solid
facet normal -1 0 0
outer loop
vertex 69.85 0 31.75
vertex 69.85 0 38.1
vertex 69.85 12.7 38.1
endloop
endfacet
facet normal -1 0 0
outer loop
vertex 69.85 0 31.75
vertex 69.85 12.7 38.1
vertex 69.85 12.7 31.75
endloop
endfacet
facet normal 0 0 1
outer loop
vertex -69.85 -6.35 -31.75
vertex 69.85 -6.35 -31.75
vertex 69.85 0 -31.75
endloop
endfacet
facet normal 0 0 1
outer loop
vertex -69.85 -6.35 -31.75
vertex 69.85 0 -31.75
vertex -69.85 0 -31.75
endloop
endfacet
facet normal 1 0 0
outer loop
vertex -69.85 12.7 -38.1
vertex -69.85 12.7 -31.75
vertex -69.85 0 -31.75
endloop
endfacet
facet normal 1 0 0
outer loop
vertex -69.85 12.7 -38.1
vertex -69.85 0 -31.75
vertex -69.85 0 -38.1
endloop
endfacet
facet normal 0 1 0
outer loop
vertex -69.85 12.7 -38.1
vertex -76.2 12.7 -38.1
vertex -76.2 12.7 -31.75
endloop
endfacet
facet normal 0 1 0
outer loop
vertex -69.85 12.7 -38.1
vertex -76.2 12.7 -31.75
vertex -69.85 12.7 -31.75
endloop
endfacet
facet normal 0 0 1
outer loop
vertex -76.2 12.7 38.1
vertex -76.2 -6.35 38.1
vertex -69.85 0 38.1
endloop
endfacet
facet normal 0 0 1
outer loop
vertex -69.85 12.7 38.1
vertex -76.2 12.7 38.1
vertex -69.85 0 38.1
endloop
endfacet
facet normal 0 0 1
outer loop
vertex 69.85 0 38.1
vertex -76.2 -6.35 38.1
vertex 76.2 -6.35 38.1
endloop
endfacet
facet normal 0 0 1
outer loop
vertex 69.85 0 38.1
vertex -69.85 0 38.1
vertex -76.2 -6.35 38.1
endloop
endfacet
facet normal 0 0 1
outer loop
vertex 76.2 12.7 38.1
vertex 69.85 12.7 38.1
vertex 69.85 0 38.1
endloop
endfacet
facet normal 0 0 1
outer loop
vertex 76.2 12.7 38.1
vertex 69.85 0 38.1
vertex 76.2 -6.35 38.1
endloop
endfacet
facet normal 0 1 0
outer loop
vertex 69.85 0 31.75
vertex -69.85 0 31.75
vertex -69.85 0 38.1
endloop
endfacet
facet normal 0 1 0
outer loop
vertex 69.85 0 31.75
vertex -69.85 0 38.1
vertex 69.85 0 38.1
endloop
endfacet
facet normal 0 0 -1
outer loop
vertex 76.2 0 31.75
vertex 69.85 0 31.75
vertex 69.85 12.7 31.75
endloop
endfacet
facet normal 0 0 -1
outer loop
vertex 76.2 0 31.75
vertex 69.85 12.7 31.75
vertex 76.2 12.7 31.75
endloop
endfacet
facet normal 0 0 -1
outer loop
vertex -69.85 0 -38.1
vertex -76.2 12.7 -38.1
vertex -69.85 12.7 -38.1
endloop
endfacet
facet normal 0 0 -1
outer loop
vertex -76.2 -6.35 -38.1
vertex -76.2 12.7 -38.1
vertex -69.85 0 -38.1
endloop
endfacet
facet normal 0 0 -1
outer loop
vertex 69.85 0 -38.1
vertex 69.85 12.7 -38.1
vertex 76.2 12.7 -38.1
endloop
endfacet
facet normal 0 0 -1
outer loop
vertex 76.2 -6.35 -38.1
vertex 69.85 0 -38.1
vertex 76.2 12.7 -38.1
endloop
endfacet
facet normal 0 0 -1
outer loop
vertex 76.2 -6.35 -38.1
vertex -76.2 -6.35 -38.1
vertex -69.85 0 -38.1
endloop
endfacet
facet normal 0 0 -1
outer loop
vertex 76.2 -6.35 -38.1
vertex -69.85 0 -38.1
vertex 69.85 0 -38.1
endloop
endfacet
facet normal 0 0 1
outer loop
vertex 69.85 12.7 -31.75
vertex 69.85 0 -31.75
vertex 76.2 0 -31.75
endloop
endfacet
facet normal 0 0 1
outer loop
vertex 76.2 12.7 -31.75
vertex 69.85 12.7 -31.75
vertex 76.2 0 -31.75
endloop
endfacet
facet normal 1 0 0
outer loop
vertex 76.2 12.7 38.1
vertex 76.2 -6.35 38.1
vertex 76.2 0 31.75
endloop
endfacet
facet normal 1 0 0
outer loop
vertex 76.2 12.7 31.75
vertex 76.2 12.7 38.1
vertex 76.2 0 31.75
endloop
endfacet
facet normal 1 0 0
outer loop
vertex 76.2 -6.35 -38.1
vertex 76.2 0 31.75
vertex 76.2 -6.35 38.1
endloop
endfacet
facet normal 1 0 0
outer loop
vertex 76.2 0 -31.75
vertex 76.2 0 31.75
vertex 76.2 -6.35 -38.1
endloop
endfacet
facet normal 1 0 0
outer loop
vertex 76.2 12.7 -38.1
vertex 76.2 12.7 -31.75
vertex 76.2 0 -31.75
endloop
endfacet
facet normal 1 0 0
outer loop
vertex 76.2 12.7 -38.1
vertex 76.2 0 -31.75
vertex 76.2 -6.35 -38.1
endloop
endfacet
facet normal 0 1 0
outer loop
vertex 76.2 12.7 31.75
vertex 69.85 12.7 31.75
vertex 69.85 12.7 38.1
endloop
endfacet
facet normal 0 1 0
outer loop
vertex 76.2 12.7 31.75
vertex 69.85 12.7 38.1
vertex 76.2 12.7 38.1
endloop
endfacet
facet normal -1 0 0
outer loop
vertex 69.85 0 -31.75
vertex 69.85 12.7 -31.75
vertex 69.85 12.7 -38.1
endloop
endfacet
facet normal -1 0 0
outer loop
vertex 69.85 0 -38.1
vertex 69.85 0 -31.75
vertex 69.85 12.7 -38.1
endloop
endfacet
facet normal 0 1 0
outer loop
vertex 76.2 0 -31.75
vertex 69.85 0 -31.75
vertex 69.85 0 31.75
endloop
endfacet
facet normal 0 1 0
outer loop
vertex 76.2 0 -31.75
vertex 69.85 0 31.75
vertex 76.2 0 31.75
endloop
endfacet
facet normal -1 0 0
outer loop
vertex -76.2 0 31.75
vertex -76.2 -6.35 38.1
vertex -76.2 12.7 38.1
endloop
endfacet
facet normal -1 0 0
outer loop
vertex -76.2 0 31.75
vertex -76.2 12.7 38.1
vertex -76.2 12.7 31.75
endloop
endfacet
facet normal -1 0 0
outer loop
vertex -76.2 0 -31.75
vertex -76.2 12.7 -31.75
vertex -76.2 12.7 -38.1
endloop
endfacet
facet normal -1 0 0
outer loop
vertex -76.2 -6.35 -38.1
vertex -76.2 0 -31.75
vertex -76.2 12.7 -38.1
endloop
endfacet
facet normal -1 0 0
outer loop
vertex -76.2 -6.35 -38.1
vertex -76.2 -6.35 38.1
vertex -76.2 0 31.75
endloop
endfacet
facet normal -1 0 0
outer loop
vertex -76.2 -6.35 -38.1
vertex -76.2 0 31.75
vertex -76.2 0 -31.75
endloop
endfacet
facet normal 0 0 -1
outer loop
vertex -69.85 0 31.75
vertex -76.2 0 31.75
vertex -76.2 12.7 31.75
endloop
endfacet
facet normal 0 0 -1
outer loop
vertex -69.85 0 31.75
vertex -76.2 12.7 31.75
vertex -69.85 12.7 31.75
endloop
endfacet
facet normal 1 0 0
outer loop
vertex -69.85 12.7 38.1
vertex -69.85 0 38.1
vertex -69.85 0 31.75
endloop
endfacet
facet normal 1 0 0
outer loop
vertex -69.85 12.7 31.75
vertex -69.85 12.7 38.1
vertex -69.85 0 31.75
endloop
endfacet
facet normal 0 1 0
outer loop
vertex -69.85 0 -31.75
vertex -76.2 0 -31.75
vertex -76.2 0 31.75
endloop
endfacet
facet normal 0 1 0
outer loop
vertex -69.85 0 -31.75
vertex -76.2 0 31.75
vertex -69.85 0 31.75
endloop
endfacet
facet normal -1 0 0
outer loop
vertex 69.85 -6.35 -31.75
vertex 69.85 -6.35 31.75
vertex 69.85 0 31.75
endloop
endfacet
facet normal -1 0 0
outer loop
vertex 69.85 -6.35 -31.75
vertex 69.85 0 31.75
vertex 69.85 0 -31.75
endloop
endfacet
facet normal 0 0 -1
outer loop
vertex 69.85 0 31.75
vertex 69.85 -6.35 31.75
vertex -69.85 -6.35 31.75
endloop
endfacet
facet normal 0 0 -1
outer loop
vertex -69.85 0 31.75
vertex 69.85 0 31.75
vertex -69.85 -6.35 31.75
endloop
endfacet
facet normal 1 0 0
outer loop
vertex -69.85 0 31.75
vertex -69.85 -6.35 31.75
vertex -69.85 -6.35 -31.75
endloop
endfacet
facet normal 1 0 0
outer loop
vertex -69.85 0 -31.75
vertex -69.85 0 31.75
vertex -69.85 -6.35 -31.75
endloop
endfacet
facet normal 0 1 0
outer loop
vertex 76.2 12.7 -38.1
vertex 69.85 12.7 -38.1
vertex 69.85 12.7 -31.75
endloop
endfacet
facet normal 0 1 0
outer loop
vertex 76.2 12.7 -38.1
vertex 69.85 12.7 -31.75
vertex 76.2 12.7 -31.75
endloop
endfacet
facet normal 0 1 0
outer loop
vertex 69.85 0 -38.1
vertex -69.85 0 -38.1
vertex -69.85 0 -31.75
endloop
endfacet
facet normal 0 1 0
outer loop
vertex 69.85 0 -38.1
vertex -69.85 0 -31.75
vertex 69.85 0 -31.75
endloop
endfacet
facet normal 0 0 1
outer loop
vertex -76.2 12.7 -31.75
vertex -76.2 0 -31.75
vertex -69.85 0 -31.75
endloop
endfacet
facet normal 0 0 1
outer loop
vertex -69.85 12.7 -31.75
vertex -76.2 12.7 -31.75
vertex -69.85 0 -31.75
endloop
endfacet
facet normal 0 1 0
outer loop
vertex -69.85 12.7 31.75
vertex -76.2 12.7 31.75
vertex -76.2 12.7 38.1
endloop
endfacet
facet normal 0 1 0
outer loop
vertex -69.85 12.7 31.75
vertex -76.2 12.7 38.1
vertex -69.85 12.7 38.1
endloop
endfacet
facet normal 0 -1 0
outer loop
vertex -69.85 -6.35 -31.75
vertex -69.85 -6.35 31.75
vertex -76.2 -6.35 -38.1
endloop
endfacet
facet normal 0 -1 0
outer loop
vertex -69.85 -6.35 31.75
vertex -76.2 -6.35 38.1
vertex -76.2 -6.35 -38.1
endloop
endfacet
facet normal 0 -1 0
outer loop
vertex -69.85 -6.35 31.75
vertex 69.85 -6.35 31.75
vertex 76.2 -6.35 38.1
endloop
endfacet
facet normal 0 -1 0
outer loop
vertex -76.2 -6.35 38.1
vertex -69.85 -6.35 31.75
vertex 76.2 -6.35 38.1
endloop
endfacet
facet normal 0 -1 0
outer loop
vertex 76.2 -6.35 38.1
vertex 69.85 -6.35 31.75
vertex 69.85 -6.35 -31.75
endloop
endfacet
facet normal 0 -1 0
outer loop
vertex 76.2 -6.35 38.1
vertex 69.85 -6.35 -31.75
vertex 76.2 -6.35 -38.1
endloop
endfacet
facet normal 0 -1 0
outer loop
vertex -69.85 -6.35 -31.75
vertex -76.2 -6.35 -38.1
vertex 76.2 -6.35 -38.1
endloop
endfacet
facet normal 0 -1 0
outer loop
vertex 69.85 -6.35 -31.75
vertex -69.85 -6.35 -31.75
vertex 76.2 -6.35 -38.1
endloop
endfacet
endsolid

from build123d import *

# Parameters (mm, degrees)
SKETCH2_W           = 152.4
SKETCH2_H           = 76.2
BOSS_EXTRUDE2_DEPTH = 6.35
SKETCH3_W           = 139.7
SKETCH3_H           = 63.5
CUT_EXTRUDE1_DEPTH  = 6.35
SKETCH4_W           = 6.35
SKETCH4_H           = 6.35
BOSS_EXTRUDE3_DEPTH = 12.7


with BuildPart() as part:
    # Sketch2 → Boss-Extrude2 (new body)
    with BuildSketch(Plane(origin=(0, 0, 0), x_dir=(1, 0, 0), z_dir=(0, 1, 0))):
        Rectangle(SKETCH2_W, SKETCH2_H)
    extrude(amount=-BOSS_EXTRUDE2_DEPTH)

    # Sketch3 → Cut-Extrude1 (cut)
    with BuildSketch(Plane(origin=(0, -6.35, 0), x_dir=(-1, 0, 0), z_dir=(0, -1, 0))):
        Rectangle(SKETCH3_W, SKETCH3_H)
    extrude(amount=-CUT_EXTRUDE1_DEPTH, mode=Mode.SUBTRACT)

    # Sketch4 → Boss-Extrude3 (add)
    with BuildSketch(Plane(origin=(0, 0, 0), x_dir=(1, 0, 0), z_dir=(0, 1, 0))):
        with Locations((-73.025, 34.925)):
            Rectangle(SKETCH4_W, SKETCH4_H)
        with Locations((-73.025, -34.925)):
            Rectangle(SKETCH4_W, SKETCH4_H)
        with Locations((73.025, -34.925)):
            Rectangle(SKETCH4_W, SKETCH4_H)
        with Locations((73.025, 34.925)):
            Rectangle(SKETCH4_W, SKETCH4_H)
    extrude(amount=BOSS_EXTRUDE3_DEPTH)


solid = part.part
